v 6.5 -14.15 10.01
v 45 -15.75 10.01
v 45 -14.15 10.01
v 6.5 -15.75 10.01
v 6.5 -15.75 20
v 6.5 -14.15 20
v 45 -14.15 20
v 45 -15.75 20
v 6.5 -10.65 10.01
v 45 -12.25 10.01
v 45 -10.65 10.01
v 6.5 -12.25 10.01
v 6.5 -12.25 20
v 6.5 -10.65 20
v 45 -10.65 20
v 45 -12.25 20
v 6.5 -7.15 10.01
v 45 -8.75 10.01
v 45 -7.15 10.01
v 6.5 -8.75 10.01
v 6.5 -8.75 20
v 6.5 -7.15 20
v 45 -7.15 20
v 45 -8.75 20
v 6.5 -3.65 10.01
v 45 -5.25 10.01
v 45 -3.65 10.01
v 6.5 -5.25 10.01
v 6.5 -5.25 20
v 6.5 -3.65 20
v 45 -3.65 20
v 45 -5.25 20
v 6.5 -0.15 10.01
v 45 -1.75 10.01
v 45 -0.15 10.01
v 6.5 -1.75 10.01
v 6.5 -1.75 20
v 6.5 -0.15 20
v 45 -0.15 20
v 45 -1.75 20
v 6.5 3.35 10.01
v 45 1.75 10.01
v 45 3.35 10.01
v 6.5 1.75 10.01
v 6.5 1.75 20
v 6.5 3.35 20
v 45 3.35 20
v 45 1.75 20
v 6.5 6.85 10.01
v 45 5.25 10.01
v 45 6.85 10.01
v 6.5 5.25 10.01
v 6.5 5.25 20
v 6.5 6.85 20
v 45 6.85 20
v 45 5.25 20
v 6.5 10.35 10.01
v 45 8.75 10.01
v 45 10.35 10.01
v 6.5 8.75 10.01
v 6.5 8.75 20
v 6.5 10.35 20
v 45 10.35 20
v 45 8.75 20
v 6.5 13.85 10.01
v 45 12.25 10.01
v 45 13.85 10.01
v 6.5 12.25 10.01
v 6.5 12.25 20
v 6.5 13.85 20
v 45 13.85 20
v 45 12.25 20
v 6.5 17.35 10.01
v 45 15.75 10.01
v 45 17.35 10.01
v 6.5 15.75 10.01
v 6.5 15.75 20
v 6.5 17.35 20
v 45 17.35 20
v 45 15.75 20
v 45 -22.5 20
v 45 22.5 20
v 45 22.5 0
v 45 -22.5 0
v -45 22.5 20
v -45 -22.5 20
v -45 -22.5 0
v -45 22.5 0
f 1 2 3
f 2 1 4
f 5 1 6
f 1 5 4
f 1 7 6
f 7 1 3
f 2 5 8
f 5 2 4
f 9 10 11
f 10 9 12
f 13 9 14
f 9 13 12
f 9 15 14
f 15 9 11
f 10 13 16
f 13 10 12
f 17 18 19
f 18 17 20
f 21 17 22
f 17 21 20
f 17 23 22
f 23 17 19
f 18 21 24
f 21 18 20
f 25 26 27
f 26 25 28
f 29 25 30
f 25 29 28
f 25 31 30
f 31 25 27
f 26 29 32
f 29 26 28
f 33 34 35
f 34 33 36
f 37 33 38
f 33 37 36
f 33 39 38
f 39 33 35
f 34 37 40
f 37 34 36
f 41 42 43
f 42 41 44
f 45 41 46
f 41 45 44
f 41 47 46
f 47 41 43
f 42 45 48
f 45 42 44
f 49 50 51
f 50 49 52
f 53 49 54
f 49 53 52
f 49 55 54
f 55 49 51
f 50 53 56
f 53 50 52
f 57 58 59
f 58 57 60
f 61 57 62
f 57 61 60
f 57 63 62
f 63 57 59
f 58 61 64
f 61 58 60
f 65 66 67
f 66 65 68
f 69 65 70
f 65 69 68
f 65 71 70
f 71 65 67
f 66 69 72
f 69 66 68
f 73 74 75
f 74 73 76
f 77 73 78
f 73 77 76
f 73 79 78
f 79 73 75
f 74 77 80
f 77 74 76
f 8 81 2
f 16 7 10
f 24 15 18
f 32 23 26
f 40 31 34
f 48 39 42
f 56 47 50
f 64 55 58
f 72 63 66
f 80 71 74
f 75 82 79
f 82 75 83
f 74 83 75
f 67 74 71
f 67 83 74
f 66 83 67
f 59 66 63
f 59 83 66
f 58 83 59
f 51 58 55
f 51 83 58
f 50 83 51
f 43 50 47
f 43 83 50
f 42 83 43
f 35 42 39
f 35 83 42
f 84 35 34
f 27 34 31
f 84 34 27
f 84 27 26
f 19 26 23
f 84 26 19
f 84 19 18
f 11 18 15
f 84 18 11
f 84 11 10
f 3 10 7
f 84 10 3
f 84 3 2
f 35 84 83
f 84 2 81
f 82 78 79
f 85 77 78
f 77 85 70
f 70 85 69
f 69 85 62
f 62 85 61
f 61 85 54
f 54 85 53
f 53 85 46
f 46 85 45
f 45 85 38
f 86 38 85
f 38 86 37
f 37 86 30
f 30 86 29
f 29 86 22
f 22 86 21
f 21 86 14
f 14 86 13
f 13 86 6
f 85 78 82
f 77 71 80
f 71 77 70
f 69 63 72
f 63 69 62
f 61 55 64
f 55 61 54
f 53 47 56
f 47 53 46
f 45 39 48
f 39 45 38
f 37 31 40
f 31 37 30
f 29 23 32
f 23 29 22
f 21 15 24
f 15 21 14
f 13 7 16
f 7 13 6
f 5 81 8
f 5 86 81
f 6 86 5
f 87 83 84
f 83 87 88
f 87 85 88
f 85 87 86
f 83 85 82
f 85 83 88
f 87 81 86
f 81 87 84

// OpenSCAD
// --- Dimensions (mm) ---
block_length = 90;      // X dimension of the base block
block_width = 45;       // Y dimension of the base block
block_height = 20;      // Z dimension of the base block

slide_length = 75;      // Length of the slide (X direction)
slide_width = 25;       // Width of the slide (Y direction)
slide_thickness = 1;    // Thickness of the slide (Z direction)

slot_count = 10;         // Number of slots
slot_length = 77;       // Length of the slot (X direction)
slot_width = 1.6;       // Width of the slot (Y direction)
slot_depth = 10;        // Depth of the slot (Z direction)
slot_spacing = 3.5;     // Center-to-center distance between slots (Y direction)

// --- Resolution ---
$fn = 64;

// --- Implementation ---

// The user requested:
// 1. Part rests on XY plane at Z=0.
// 2. Centered on the origin in X and Y.
// 3. 10 parallel slots running along X.
// 4. Slots are 77mm long, 1.6mm wide, 10mm deep.
// 5. Slots are 3.5mm apart center-to-center.
// 6. The group of slots is centered on the block in X and Y.

module drying_rack() {
    difference() {
        // Main block body
        // We use a cube centered at the origin for X and Y, 
        // but we must ensure it starts at Z=0.
        translate([-block_length/2, -block_width/2, 0])
            cube([block_length, block_width, block_height]);

        // Generate the slots
        for (i = [0 : slot_count - 1]) {
            // Calculate Y position for the center of the current slot
            // To center the group of 10 slots (9 gaps) in Y:
            // Total span of centers = (10 - 1) * 3.5 = 31.5
            // Y_offset = (i * 3.5) - (31.5 / 2)
            y_offset = (i * slot_spacing) - ((slot_count - 1) * slot_spacing / 2);
            
            // The slots are centered on the block in X.
            // X_offset = (90 - 77) / 2 = 6.5
            x_offset = (block_length - slot_length) / 2;
            
            // The slots are cut into the top face.
            // Top face is at Z = block_height.
            // We cut from Z = block_height down to Z = block_height - slot_depth.
            // We extend the cutting shape by 0.1mm to ensure no coplanar faces.
            translate([x_offset, y_offset, block_height - slot_depth + 0.01]) {
                cube([slot_length, slot_width, slot_depth + 0.01]);
            }
        }
    }
}

// Final assembly:
// The module already handles the X, Y, and Z=0 positioning.
// We just call it.
drying_rack();
